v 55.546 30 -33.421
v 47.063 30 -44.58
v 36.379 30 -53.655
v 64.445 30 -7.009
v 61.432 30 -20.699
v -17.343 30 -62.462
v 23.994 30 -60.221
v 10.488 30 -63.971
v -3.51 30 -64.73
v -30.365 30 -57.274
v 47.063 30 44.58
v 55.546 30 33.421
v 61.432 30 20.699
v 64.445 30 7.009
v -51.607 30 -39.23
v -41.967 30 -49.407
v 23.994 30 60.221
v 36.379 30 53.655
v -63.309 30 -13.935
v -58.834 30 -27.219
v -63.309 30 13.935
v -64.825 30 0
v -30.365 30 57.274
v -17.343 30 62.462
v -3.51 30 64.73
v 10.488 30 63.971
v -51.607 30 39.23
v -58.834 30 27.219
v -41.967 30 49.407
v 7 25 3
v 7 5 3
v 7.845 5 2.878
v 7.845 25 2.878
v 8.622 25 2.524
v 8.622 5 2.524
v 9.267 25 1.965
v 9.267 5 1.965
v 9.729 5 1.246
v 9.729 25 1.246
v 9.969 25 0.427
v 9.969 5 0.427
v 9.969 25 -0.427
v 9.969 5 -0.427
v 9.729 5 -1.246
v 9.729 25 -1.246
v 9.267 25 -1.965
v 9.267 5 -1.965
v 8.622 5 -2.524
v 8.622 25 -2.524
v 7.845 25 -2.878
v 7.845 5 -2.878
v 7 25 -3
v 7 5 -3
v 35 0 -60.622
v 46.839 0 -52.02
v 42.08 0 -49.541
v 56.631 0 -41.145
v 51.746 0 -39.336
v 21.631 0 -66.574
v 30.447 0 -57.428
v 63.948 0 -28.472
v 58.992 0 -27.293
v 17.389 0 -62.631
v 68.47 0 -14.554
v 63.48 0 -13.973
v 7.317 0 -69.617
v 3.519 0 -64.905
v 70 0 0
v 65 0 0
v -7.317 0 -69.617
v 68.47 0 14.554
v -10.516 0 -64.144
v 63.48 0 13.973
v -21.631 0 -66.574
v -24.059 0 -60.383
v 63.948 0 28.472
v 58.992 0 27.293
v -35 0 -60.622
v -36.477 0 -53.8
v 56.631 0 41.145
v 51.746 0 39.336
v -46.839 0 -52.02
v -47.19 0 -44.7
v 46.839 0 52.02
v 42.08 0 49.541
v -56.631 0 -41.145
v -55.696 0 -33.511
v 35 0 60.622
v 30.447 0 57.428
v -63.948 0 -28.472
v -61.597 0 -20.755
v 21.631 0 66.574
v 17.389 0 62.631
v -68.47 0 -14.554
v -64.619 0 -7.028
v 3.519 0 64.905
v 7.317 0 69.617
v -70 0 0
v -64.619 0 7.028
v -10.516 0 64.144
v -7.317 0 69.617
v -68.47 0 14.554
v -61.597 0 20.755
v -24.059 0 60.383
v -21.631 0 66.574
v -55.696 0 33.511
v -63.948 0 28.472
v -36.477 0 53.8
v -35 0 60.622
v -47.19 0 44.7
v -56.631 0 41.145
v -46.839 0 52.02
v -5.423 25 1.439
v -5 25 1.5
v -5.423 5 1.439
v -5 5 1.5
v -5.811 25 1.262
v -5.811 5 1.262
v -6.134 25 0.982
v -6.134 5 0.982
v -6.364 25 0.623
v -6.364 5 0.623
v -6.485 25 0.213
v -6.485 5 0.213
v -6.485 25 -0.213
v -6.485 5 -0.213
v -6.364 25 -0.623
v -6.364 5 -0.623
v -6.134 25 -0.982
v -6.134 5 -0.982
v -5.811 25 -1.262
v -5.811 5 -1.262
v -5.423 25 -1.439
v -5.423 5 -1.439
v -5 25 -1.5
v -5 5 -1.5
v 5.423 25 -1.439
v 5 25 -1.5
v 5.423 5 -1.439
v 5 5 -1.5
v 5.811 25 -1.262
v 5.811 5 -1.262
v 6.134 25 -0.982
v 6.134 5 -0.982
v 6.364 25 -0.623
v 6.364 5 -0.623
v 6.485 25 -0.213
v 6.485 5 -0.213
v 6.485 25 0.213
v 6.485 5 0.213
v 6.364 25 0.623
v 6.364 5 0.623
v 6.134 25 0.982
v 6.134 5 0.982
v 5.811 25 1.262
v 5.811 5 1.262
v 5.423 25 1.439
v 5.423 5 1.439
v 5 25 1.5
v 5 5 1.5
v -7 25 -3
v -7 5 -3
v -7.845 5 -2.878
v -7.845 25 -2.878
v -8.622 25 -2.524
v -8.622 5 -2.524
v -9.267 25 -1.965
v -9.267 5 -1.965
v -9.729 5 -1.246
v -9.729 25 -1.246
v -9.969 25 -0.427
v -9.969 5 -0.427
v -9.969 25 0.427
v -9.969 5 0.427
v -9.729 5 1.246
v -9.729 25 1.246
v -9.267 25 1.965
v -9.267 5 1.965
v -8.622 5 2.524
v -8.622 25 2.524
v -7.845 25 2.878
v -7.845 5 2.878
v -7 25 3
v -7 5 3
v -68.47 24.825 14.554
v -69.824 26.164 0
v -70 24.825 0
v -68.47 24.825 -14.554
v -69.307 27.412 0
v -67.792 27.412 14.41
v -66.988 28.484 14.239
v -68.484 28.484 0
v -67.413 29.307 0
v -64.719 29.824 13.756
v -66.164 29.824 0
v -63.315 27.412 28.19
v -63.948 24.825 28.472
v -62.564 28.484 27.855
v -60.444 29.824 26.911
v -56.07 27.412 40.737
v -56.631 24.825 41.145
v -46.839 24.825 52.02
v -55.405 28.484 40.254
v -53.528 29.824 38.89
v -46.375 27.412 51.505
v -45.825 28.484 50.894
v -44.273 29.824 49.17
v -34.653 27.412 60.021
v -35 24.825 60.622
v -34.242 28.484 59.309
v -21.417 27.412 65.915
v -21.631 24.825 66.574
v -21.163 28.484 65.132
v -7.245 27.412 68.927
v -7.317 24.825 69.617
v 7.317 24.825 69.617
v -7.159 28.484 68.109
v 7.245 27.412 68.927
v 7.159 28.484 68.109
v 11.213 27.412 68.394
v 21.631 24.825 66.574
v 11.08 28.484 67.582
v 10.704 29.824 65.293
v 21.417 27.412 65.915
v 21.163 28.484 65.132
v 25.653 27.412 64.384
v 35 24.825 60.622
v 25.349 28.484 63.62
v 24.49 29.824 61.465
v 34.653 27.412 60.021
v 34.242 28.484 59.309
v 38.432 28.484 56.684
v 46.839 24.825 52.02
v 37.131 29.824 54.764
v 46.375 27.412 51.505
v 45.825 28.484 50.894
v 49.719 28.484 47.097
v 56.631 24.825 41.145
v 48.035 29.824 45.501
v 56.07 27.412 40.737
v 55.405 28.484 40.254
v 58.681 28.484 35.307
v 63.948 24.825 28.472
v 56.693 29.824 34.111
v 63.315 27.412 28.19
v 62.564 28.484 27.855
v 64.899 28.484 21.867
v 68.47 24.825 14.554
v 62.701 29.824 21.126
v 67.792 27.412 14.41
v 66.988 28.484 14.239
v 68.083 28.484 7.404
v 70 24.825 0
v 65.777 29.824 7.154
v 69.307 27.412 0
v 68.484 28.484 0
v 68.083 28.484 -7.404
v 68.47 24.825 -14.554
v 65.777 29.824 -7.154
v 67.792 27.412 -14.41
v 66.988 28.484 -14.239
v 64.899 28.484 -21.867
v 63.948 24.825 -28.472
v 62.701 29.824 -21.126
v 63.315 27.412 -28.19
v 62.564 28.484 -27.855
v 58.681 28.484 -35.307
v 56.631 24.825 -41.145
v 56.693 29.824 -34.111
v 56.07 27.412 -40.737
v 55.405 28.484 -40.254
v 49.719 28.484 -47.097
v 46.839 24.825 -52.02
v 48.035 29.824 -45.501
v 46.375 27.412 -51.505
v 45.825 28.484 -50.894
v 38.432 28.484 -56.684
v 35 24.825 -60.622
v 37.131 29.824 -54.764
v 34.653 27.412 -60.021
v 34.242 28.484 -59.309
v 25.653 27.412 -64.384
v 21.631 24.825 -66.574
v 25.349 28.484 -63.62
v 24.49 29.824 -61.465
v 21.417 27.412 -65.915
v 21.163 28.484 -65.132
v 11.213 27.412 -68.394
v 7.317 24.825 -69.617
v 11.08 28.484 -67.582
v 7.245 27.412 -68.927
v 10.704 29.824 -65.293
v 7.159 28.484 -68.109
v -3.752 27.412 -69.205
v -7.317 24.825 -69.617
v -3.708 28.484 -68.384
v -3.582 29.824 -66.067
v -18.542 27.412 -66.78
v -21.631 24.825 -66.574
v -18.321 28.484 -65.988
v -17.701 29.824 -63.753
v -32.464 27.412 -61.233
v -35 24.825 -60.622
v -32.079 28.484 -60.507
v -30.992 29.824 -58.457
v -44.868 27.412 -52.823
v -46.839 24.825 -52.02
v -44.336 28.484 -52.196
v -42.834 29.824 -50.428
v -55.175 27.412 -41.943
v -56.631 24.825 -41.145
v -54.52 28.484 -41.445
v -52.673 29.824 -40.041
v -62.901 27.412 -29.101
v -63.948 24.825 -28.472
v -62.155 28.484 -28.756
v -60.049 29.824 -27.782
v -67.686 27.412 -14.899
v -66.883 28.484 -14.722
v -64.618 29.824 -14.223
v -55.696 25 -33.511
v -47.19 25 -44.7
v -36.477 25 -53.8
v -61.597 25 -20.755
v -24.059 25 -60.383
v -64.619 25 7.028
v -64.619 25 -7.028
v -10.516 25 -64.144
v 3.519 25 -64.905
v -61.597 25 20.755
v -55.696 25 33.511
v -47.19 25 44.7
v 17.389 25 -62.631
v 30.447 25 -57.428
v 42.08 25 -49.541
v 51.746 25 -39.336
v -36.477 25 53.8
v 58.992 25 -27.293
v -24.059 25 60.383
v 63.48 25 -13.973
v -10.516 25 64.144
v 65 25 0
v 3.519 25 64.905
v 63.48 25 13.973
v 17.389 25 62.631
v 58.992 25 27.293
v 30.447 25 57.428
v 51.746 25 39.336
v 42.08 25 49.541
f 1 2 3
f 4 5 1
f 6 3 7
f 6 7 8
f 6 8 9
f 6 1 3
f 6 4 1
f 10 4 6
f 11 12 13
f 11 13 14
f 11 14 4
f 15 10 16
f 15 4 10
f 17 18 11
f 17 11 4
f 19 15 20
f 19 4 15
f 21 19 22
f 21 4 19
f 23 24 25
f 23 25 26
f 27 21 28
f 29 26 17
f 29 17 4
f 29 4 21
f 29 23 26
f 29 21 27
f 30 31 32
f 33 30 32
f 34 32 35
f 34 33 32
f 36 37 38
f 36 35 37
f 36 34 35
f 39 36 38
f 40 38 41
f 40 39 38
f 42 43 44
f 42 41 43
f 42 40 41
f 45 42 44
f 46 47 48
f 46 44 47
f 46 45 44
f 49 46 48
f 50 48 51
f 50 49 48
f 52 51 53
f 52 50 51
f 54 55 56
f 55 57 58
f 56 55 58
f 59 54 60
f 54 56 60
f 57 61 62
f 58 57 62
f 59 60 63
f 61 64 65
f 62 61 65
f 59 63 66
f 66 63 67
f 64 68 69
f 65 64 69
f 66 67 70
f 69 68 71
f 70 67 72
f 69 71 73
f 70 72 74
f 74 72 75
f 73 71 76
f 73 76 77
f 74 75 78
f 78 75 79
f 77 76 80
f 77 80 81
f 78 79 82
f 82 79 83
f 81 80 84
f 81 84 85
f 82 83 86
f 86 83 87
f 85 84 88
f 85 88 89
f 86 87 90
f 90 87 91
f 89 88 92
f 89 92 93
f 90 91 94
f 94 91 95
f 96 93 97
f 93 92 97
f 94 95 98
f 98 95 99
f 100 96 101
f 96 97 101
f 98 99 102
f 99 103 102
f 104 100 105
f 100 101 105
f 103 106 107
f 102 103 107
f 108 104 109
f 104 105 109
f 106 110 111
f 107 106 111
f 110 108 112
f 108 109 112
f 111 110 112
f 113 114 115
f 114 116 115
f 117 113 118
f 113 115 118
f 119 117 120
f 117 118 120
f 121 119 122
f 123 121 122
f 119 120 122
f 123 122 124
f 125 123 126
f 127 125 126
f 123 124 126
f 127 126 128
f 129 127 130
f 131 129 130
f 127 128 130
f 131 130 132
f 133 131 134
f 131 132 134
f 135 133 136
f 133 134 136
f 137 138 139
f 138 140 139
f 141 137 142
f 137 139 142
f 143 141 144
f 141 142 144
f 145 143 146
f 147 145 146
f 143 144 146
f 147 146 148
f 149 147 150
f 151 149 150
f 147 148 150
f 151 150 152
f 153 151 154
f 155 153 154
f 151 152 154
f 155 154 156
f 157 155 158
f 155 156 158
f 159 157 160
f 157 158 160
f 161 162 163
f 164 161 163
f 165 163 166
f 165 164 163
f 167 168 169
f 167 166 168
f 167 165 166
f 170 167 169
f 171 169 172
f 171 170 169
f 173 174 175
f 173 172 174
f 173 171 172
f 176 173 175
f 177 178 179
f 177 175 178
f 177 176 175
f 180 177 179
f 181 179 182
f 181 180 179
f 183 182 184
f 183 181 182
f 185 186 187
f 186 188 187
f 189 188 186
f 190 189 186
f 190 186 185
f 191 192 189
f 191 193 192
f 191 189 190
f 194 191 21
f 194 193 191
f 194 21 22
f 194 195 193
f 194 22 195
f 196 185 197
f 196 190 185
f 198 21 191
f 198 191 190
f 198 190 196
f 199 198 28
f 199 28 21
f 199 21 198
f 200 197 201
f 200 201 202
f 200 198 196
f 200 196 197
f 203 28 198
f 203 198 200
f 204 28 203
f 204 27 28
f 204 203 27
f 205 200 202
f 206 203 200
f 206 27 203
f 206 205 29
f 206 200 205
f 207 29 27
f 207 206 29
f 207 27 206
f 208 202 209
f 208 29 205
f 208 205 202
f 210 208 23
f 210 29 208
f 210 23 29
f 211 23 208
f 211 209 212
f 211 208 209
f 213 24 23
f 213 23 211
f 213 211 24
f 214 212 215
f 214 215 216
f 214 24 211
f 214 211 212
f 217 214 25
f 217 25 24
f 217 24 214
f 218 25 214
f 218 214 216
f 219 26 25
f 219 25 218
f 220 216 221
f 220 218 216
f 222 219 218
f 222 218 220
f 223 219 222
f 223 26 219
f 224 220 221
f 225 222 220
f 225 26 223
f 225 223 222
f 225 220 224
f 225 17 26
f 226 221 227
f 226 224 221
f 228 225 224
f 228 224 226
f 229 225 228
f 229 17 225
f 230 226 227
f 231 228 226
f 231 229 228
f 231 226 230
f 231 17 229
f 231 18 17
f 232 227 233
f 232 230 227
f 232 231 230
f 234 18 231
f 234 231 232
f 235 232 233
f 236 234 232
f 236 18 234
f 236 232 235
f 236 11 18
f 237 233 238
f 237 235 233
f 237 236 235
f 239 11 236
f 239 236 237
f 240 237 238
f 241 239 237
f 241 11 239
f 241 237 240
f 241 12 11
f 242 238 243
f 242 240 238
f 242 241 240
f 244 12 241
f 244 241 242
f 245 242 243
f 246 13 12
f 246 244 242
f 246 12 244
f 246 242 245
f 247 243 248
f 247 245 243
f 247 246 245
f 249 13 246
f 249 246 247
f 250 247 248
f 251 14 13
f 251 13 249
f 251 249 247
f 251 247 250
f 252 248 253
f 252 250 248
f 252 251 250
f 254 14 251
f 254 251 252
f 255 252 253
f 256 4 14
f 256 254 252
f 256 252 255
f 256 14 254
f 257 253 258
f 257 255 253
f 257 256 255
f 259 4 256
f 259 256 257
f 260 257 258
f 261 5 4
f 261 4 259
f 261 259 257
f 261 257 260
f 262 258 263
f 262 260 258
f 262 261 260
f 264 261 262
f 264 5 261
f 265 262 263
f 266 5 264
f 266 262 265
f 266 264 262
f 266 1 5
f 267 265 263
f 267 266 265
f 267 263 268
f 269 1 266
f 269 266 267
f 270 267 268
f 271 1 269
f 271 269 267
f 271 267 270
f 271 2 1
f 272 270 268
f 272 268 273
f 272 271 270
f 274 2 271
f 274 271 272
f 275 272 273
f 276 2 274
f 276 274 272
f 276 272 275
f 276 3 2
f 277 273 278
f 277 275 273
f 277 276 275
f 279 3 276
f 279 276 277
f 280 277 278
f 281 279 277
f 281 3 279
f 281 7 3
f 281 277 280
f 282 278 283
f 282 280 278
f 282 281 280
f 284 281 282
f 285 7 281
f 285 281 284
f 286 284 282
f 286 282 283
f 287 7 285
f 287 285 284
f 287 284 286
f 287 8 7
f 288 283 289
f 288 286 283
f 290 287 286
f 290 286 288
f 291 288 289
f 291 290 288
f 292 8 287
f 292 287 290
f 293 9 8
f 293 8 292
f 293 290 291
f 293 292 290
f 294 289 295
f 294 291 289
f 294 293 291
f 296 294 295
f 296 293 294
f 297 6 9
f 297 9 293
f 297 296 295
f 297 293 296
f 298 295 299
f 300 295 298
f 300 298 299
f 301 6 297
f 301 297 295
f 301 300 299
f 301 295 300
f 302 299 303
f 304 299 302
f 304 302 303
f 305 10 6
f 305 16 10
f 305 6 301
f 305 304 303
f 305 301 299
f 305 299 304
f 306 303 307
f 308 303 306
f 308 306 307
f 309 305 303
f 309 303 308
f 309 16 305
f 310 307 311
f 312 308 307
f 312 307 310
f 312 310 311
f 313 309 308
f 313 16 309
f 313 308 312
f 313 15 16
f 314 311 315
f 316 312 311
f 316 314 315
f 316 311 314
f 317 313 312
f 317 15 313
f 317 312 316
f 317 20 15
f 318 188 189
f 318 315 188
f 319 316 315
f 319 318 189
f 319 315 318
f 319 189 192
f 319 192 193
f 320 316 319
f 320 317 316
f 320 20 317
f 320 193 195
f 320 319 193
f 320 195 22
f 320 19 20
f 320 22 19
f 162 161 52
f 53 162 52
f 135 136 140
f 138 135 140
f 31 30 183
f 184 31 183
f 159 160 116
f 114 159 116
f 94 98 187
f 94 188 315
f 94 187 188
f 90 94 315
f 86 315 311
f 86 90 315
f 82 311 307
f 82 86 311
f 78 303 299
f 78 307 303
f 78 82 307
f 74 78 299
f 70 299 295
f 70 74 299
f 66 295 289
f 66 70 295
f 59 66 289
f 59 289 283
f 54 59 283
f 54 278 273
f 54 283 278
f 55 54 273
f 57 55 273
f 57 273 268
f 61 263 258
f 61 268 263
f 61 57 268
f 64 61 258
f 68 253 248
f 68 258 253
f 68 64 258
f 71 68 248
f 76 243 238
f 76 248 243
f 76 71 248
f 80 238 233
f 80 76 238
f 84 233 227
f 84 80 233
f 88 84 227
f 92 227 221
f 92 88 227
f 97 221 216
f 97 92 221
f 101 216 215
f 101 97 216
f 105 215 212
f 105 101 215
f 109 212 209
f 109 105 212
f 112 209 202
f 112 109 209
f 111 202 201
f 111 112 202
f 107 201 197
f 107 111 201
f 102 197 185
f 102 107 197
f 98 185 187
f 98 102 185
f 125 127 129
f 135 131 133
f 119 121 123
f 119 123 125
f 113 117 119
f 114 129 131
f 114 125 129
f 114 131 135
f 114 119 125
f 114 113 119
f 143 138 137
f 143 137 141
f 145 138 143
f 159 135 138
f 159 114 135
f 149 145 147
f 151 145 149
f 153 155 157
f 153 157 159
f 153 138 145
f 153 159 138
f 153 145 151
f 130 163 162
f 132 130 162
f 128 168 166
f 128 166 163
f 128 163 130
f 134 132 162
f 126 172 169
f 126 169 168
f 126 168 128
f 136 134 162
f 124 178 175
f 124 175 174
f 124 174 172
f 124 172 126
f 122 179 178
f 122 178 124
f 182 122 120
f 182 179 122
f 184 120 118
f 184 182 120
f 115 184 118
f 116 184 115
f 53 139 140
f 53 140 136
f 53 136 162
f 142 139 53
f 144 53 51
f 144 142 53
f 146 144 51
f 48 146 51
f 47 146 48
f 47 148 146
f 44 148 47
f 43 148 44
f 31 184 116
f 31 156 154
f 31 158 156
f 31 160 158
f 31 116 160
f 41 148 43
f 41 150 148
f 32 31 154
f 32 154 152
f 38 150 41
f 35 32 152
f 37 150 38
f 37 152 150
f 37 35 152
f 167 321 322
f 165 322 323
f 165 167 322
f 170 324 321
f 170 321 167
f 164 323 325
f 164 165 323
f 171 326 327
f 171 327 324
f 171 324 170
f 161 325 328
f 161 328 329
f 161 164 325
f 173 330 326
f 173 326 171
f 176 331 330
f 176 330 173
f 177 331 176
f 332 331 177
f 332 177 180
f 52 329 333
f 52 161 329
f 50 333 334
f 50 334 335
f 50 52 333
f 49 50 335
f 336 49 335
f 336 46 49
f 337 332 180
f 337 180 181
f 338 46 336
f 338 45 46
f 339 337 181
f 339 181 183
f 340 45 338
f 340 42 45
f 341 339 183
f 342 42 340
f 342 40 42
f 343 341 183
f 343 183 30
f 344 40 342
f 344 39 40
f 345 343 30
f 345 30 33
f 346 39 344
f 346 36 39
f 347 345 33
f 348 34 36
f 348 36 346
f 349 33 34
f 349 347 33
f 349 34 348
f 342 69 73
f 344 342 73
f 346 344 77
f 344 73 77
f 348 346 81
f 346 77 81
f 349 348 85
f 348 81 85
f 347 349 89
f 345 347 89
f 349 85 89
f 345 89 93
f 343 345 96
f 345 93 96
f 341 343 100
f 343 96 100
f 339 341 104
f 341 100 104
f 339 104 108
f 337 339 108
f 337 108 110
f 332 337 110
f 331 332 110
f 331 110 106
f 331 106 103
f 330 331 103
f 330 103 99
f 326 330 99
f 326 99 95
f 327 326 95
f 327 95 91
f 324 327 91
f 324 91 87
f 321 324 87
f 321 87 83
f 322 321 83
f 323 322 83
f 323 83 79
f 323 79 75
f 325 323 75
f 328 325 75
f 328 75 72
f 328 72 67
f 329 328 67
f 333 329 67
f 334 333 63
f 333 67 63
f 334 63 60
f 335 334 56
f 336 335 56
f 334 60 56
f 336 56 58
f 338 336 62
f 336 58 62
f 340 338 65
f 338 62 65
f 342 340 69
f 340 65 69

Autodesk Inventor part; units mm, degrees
ref_plane "YZ Plane" through (0, 0, 0) normal (1, 0, 0) x (0, 1, 0)
ref_plane "XZ Plane" through (0, 0, 0) normal (0, 1, 0) x (-1, 0, 0)
ref_plane "XY Plane" through (0, 0, 0) normal (0, 0, 1) x (1, 0, 0)
sketch "Sketch1" plane through (0, 0, 0) normal (0, 1, 0) x (-1, 0, 0)
  circle A0 centre (0, 0) radius 70
  dimension "d0" = 140
extrude "Extrusion1" add sketch "Sketch1" along normal blind 30
sketch "Sketch2" plane through (0, 30, 0) normal (0, 1, 0) x (1, 0, 0)
  point P0 (0, 0)
fillet "Fillet1" radius 5.175 1 edges at (70, 30, 0)
sketch "Sketch3" plane through (0, 0, 0) normal (0, -1, 0) x (1, 0, 0)
  circle A0 centre (0, 0) radius 65
  dimension "d4" = 130
extrude "Extrusion2" cut sketch "Sketch3" against normal blind 25
sketch "Sketch5" plane through (0, 25, 0) normal (0, -1, 0) x (1, 0, 0)
  line L0 (-7, 0) -> (7, 0) construction
  line L1 (-7, -3) -> (7, -3)
  line L2 (7, 3) -> (-7, 3)
  arc A0 (-7, 3) -> (-7, -3) centre (-7, 0) ccw
  arc A1 (7, -3) -> (7, 3) centre (7, 0) ccw
  point P0 (0, 0)
  dimension "d11" = 7
  dimension "d12" = 6
extrude "Extrusion4" add sketch "Sketch5" along normal blind 20
sketch "Sketch6" plane through (0, 5, 0) normal (0, -1, 0) x (1, 0, 0)
  line L0 (-5, 0) -> (5, 0) construction
  line L1 (-5, -1.5) -> (5, -1.5)
  line L2 (5, 1.5) -> (-5, 1.5)
  arc A0 (-5, 1.5) -> (-5, -1.5) centre (-5, 0) ccw
  arc A1 (5, -1.5) -> (5, 1.5) centre (5, 0) ccw
  point P0 (0, 0)
  dimension "d15" = 5
  dimension "d16" = 3
extrude "Extrusion5" cut sketch "Sketch6" against normal blind 20
properties part number "Drehplatform_prototyp"
